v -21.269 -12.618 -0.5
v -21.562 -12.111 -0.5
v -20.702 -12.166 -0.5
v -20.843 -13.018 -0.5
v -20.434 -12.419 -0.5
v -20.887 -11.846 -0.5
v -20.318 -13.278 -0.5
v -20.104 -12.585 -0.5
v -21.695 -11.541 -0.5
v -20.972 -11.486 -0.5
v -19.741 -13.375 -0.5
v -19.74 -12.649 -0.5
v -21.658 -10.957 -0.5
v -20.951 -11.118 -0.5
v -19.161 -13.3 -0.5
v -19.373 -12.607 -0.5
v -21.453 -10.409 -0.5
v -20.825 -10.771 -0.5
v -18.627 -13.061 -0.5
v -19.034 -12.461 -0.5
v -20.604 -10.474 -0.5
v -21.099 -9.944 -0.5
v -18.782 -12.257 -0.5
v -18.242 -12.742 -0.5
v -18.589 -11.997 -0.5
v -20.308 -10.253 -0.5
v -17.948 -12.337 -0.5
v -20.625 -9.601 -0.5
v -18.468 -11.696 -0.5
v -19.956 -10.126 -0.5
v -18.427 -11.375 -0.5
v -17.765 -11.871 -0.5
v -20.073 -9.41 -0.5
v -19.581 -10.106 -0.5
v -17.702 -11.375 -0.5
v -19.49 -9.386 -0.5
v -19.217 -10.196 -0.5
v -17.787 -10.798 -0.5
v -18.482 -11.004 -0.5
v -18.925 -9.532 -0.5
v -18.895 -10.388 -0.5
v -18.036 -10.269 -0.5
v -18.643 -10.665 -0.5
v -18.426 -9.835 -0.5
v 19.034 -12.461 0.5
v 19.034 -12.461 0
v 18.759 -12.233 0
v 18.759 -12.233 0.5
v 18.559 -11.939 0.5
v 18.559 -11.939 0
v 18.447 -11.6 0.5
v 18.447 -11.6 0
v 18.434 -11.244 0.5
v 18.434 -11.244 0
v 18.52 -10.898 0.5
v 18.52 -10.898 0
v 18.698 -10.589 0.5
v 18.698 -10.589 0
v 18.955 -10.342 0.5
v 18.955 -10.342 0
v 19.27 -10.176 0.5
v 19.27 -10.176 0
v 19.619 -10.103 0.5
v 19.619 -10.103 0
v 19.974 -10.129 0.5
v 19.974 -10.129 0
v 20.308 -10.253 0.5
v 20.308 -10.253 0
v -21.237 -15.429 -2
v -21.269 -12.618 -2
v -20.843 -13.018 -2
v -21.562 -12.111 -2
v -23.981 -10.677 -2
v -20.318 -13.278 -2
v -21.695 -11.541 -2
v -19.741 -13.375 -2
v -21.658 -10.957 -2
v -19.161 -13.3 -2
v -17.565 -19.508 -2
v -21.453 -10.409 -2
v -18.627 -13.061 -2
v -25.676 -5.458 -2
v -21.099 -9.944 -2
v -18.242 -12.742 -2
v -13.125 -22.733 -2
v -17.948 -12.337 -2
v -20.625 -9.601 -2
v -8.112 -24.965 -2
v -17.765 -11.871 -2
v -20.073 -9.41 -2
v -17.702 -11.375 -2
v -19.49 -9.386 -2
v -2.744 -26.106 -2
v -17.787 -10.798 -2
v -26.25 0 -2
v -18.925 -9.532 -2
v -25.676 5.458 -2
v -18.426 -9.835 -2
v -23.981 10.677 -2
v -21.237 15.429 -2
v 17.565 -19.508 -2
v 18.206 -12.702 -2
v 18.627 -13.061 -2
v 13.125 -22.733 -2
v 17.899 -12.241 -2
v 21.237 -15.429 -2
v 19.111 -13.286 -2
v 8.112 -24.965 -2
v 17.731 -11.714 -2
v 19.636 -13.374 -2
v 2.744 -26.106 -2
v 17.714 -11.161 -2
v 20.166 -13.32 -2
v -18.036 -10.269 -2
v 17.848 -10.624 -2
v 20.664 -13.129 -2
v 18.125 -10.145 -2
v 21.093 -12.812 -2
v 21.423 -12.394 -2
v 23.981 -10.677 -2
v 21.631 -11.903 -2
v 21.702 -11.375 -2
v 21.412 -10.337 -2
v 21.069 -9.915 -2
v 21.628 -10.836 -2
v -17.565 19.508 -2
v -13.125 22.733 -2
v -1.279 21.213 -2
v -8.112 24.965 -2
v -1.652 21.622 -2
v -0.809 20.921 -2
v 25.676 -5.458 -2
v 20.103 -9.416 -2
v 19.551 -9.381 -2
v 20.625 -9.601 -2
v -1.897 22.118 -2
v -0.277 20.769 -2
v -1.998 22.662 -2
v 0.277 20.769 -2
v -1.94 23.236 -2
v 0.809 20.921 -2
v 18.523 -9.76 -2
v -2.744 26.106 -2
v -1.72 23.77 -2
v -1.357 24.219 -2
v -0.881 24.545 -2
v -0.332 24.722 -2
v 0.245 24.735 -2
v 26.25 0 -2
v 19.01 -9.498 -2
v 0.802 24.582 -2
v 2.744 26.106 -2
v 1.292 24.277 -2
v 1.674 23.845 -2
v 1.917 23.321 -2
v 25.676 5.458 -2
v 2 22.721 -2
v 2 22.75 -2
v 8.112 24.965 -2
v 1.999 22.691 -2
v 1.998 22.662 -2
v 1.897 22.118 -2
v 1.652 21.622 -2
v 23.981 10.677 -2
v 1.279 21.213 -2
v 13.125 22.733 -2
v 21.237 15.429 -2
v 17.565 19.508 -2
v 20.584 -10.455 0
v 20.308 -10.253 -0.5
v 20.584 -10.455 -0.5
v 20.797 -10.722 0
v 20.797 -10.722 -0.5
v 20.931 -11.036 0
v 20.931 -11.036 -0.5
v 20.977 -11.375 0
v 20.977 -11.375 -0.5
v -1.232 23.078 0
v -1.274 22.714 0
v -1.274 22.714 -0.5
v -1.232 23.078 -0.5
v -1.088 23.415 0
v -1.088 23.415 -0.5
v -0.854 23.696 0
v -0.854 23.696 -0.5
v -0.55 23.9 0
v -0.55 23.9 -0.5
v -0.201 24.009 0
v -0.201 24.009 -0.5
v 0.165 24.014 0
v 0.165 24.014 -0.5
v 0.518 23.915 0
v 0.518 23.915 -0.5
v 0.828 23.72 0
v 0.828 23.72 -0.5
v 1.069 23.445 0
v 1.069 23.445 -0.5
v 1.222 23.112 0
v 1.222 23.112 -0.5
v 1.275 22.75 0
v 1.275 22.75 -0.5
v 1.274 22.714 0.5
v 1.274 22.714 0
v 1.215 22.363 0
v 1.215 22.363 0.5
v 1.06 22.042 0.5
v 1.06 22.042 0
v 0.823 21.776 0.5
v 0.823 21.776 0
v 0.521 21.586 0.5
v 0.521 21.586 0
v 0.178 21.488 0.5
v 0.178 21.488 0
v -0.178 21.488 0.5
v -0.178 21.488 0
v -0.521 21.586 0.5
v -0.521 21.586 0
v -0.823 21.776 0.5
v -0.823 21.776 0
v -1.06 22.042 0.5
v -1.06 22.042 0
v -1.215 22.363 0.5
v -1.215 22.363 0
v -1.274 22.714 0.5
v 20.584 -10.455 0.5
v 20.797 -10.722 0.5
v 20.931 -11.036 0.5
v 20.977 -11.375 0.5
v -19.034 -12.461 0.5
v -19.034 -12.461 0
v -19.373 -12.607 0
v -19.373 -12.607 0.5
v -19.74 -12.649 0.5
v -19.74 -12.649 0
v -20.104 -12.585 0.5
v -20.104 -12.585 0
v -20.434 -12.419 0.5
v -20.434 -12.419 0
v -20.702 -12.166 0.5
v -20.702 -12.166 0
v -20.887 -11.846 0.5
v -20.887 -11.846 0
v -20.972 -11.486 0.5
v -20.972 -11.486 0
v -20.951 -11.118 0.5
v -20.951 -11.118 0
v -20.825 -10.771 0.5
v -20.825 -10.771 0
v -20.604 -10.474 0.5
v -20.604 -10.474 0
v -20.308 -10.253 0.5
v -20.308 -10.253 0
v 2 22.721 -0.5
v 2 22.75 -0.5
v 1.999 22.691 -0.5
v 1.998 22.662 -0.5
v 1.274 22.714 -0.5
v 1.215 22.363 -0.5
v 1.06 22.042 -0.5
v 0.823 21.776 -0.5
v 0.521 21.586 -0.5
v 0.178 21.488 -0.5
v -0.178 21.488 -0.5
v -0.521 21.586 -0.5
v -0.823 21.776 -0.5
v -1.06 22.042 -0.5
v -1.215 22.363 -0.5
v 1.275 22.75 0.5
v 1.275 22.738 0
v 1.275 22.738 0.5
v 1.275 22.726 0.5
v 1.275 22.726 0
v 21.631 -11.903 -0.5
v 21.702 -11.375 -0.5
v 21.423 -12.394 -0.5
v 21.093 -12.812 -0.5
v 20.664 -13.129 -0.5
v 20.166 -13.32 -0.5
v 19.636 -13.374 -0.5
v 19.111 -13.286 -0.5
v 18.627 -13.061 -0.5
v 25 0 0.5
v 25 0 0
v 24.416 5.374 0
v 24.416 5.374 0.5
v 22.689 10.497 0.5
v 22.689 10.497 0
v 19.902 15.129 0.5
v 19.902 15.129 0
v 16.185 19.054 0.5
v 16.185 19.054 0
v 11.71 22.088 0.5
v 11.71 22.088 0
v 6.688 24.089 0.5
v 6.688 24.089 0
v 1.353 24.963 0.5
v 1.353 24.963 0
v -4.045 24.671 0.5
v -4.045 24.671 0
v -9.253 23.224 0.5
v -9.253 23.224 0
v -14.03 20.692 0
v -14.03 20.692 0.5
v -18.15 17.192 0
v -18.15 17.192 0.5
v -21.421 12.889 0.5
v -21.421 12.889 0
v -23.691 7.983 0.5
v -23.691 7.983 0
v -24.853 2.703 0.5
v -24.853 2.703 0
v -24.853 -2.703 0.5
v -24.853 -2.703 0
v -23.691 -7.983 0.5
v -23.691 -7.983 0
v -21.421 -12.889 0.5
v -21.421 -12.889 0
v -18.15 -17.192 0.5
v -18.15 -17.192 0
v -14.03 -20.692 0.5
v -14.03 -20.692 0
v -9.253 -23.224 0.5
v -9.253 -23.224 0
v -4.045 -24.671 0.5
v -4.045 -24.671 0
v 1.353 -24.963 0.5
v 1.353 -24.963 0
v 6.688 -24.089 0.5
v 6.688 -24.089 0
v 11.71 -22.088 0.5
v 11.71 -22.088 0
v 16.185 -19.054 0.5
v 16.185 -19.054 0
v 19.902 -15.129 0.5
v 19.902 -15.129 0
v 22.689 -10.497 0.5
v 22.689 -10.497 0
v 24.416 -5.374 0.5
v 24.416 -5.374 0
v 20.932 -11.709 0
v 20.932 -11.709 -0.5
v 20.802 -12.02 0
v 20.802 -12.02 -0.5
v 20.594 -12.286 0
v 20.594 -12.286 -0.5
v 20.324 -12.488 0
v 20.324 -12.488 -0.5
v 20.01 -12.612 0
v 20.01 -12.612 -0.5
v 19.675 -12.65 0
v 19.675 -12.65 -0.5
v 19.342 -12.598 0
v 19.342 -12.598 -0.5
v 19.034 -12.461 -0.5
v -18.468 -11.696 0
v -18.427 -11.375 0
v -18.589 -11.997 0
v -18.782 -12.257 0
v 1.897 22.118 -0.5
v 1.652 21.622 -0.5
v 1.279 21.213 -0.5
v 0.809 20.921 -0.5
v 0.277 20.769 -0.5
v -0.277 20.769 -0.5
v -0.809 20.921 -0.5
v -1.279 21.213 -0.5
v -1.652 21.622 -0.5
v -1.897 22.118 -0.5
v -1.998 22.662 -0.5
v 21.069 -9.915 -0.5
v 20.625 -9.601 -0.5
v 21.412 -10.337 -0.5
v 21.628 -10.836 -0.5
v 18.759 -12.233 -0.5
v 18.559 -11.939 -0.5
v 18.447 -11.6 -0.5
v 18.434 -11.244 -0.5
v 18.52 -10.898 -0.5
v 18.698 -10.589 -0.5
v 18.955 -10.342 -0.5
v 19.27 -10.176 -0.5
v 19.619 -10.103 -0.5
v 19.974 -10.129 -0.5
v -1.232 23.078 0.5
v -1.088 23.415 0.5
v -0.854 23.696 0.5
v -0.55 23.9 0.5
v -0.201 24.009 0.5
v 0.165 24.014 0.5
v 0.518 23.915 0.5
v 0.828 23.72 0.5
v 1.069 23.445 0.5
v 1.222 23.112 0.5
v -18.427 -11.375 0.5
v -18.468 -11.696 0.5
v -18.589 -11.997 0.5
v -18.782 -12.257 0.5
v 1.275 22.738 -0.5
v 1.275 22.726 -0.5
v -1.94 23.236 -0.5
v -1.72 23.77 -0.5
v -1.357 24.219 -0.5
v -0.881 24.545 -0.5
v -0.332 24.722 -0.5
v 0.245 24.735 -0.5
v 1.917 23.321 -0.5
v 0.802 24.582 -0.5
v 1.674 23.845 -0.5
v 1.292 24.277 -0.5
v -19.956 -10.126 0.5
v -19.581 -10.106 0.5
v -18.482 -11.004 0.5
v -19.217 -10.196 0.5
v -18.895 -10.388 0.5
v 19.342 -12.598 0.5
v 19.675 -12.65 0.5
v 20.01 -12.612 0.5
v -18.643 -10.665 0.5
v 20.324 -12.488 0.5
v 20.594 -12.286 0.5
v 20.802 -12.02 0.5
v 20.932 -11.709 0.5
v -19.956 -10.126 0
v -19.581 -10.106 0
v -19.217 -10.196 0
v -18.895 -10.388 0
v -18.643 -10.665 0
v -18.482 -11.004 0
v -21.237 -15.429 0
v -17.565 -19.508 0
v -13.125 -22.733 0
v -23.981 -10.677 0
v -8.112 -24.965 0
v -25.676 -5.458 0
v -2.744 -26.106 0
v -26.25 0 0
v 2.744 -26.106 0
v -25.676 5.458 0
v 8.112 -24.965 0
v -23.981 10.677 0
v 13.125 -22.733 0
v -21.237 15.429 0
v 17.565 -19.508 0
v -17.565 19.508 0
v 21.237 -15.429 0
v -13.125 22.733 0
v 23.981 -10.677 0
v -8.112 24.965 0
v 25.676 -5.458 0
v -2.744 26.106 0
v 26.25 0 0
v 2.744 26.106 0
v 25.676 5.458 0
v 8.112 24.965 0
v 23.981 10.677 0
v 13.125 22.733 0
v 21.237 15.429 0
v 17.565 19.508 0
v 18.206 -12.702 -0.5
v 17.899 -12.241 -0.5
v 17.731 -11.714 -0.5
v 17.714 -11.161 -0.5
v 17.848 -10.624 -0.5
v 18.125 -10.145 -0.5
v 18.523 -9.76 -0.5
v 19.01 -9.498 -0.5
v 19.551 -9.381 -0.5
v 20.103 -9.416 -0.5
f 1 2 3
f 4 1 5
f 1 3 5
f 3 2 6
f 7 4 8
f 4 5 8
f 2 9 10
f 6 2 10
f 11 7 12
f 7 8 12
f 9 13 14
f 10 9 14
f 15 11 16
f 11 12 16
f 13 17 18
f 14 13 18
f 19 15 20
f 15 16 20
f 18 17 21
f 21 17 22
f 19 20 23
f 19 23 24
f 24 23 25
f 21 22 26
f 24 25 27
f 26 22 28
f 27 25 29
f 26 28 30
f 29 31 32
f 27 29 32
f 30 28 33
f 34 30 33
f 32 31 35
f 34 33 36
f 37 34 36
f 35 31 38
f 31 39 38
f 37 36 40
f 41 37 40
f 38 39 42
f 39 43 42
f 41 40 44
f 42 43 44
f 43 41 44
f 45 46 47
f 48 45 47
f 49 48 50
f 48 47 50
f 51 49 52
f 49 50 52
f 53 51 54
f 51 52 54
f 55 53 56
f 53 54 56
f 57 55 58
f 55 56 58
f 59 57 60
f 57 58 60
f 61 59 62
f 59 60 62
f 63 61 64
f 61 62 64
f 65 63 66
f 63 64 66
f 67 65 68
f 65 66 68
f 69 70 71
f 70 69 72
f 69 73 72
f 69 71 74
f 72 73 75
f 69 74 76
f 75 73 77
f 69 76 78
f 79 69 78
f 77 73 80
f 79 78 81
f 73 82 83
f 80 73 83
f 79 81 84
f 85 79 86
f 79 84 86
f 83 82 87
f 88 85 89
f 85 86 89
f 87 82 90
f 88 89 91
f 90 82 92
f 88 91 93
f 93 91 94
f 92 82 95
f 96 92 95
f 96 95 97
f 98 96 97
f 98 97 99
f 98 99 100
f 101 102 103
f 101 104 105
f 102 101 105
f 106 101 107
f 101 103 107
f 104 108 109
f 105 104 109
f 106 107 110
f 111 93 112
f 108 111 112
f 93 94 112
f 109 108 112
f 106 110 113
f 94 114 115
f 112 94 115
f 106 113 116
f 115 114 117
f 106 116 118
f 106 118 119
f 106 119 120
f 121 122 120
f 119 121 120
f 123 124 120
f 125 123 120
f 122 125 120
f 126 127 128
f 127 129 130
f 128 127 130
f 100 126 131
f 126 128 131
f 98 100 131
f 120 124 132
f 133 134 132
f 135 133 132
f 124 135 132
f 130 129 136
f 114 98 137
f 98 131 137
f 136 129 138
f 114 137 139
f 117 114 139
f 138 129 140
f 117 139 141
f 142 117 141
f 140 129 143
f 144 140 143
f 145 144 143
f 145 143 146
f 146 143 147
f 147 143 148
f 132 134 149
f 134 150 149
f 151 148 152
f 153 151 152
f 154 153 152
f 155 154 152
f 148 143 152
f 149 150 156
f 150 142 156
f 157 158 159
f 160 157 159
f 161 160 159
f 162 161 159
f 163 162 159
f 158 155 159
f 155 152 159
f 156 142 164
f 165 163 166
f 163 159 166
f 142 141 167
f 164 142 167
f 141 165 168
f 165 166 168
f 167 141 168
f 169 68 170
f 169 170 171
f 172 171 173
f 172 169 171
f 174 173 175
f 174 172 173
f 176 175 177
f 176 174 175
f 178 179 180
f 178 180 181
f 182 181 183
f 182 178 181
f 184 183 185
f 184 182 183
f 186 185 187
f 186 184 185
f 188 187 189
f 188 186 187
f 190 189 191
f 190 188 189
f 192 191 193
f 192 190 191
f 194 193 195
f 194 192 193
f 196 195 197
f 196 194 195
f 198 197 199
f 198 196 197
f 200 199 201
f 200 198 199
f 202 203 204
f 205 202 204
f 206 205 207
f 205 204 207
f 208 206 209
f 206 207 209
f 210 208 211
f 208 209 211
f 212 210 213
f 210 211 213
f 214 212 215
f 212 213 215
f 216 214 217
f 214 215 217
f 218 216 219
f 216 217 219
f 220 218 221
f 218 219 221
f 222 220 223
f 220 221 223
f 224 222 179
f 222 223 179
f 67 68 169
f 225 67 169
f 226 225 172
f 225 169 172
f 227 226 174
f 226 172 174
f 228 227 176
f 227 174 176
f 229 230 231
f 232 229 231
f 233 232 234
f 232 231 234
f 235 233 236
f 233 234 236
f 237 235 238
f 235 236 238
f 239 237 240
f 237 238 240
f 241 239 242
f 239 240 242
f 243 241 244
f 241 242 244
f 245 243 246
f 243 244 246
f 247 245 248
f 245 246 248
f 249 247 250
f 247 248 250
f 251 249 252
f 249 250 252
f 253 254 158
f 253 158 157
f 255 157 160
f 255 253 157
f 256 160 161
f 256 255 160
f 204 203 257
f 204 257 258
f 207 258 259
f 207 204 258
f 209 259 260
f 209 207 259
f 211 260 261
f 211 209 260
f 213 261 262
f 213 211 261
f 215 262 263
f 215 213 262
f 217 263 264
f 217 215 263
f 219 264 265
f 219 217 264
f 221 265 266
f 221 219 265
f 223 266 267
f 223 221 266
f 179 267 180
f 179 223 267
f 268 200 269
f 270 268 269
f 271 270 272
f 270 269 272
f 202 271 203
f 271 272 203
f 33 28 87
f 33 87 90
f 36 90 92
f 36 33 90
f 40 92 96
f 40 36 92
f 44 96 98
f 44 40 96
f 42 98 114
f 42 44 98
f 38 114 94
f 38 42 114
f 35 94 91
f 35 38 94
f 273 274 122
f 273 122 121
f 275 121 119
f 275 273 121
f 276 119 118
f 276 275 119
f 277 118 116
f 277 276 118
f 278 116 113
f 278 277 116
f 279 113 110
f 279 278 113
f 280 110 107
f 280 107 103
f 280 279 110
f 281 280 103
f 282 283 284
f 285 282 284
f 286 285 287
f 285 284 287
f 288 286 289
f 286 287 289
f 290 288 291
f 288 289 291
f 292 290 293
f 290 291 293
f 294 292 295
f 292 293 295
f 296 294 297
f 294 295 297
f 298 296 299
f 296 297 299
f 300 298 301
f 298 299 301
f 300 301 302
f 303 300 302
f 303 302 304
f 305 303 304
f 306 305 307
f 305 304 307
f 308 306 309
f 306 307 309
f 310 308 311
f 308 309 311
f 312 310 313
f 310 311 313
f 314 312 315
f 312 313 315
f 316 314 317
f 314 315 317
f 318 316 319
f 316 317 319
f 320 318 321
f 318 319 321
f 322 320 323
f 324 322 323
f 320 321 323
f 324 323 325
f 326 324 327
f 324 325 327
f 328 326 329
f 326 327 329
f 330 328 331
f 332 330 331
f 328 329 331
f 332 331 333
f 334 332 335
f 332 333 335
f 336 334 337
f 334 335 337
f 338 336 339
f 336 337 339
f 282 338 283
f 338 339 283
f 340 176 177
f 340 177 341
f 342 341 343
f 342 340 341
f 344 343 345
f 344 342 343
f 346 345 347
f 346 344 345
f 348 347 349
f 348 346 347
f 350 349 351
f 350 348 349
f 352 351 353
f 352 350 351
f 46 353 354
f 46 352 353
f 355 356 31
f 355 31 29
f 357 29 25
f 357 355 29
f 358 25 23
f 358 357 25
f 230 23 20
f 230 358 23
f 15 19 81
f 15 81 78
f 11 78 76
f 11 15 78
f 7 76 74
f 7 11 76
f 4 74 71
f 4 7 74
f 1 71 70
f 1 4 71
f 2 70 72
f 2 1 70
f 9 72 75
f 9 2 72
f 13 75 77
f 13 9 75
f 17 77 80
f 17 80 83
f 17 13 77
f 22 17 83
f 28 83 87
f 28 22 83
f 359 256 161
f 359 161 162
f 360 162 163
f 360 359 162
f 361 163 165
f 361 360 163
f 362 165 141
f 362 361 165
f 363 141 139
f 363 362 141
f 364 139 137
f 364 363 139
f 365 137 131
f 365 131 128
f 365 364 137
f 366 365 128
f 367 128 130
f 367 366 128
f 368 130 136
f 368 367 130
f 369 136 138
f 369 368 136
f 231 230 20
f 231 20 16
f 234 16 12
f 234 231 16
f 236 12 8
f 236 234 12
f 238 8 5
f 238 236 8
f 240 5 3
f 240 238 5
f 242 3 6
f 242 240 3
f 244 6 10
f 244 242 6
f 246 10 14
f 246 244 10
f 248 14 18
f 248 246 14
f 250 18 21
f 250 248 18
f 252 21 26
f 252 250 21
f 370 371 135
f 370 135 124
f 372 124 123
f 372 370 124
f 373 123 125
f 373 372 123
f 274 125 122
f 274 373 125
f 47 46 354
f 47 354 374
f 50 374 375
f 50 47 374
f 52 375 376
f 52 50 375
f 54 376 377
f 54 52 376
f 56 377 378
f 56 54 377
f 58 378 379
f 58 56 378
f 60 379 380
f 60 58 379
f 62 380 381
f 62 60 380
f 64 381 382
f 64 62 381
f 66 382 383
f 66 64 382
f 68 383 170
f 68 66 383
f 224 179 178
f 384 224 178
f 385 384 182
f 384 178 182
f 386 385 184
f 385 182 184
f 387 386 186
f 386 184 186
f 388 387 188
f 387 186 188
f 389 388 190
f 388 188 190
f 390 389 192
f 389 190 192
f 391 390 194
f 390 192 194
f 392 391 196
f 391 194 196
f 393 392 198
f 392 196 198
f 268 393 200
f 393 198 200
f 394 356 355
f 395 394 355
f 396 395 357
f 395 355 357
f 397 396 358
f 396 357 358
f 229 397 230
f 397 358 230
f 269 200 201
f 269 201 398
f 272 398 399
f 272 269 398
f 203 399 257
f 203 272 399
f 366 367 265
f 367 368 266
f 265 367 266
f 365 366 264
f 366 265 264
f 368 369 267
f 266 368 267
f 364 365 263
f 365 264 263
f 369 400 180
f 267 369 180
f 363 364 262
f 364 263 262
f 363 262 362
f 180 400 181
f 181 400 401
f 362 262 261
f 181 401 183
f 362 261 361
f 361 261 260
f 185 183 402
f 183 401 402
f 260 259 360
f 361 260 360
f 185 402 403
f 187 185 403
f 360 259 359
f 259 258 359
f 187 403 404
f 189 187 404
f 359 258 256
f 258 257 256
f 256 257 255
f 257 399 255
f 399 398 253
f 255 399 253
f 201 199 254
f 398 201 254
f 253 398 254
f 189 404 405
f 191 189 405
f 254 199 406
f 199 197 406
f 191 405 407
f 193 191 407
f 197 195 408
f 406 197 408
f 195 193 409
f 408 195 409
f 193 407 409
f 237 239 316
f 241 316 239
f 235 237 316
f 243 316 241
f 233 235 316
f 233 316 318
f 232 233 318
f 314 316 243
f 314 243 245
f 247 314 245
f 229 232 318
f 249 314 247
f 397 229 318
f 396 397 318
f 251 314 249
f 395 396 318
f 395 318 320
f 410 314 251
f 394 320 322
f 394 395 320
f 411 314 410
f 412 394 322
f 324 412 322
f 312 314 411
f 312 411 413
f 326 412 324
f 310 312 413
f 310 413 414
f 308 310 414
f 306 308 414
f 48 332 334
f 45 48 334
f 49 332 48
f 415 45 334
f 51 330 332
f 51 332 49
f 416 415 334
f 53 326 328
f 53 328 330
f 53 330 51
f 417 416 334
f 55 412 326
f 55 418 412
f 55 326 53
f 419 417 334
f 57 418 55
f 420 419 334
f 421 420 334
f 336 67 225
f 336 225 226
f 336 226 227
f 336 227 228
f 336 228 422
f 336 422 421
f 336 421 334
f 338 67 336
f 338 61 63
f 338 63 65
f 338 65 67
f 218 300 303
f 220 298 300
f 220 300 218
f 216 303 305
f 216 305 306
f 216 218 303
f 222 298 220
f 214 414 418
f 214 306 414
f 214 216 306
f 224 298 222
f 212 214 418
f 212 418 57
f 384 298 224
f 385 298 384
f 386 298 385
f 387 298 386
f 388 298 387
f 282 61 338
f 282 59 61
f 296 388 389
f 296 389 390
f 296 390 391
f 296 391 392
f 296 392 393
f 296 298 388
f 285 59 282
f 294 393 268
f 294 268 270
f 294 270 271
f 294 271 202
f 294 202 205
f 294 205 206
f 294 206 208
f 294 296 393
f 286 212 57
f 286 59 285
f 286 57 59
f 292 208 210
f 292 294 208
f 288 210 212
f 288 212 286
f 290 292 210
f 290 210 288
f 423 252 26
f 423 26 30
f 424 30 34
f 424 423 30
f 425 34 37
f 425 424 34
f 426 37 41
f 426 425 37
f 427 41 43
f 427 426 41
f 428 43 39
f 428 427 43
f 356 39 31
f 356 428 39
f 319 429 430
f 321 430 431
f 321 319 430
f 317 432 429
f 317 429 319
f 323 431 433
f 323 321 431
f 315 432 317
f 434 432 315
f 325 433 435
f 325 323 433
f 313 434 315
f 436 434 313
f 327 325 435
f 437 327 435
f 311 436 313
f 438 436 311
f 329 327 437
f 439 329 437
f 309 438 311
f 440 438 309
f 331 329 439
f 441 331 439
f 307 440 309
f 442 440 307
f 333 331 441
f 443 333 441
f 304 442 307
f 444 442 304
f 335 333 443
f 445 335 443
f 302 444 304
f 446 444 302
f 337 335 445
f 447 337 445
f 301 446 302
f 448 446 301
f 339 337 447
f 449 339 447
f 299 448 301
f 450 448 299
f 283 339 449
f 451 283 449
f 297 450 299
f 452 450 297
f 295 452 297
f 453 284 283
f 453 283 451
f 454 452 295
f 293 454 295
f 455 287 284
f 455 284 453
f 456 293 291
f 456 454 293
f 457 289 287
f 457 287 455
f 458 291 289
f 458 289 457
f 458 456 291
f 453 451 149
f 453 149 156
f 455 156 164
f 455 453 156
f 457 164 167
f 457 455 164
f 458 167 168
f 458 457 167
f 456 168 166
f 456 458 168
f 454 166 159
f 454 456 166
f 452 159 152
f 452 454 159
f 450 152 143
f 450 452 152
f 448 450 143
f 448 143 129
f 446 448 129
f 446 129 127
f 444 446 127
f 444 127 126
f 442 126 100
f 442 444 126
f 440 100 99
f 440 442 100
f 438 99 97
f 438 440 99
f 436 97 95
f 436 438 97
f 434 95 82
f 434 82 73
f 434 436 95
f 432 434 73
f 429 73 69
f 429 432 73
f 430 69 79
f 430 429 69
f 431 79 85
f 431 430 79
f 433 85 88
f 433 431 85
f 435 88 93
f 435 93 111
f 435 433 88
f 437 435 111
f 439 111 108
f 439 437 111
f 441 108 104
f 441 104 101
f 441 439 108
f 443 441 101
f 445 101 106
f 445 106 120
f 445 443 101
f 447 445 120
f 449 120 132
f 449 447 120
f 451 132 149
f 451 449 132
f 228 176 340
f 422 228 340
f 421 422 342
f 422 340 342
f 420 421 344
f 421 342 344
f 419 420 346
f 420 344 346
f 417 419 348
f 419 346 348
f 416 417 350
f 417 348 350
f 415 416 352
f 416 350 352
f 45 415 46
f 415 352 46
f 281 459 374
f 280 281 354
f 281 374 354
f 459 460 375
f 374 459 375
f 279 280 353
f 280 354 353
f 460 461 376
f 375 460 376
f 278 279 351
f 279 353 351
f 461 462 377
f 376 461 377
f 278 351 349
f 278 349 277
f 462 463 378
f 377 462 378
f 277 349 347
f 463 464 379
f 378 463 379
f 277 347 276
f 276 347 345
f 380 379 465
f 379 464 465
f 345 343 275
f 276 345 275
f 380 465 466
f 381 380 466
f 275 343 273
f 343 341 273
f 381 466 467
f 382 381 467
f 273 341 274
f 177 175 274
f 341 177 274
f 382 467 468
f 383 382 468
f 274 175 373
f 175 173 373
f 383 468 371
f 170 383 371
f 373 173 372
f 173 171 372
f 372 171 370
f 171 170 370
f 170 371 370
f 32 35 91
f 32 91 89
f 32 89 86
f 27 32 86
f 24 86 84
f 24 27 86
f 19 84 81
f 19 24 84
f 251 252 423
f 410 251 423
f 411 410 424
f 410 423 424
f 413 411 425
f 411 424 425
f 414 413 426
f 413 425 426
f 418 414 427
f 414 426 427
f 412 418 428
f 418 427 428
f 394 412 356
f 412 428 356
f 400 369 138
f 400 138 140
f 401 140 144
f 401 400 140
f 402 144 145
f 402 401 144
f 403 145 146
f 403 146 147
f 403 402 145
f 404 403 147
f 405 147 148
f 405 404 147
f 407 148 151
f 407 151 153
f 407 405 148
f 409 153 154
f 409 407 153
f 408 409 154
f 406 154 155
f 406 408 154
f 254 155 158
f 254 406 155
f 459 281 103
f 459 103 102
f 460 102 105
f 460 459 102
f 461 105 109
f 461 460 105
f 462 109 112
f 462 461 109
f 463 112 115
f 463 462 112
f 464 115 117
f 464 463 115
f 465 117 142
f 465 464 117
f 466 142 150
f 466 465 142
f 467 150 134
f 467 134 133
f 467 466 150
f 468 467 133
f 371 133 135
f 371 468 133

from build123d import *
from build123d import SkipClean  # not in build123d's __all__

# Parameters (mm, degrees)
F0_R     = 25
F1_DEPTH = 0.5
F0_R_2   = 26.25
F2_DEPTH = 2
F3_DEPTH = 0.5


with BuildPart() as f1:
    # F0 (on Top) → F1 (new body)
    with BuildSketch(Plane.XY):
        Circle(F0_R)
        with BuildLine():
            ThreePointArc((1.998066932, 22.6620879121), (16.7782377308, 15.3640241684), (22.75, 0))
            ThreePointArc((22.75, 0), (22.2123921898, -4.9165163688), (20.6249773007, -9.6006672345))
            ThreePointArc((20.6249773007, -9.6006672345), (21.4117268371, -10.3371654104), (21.7020779361, -11.375))
            ThreePointArc((21.7020779361, -11.375), (20.6637600211, -13.12861557), (18.6269103687, -13.0614206776))
            ThreePointArc((18.6269103687, -13.0614206776), (0, -22.75), (-18.6269103687, -13.0614206776))
            ThreePointArc((-18.6269103687, -13.0614206776), (-21.4341287437, -12.375), (-20.6249773007, -9.6006672345))
            ThreePointArc((-20.6249773007, -9.6006672345), (-19.7020779361, 11.375), (-1.998066932, 22.6620879121))
            ThreePointArc((-1.998066932, 22.6620879121), (-0.0439666691, 24.7495166746), (2, 22.75))
            ThreePointArc((2, 22.75), (1.9995166746, 22.7060333309), (1.998066932, 22.6620879121))
        make_face(mode=Mode.SUBTRACT)
        with BuildLine():
            ThreePointArc((20.6249773007, -9.6006672345), (22.2123921898, -4.9165163688), (22.75, 0))
            ThreePointArc((22.75, 0), (16.7782377308, 15.3640241684), (1.998066932, 22.6620879121))
            ThreePointArc((1.998066932, 22.6620879121), (0, 20.75), (-1.998066932, 22.6620879121))
            ThreePointArc((-1.998066932, 22.6620879121), (-19.7020779361, 11.375), (-20.6249773007, -9.6006672345))
            ThreePointArc((-20.6249773007, -9.6006672345), (-18.6642433465, -9.665351099), (-17.7020779361, -11.375))
            ThreePointArc((-17.7020779361, -11.375), (-17.9484623661, -12.336682085), (-18.6269103687, -13.0614206776))
            ThreePointArc((-18.6269103687, -13.0614206776), (0, -22.75), (18.6269103687, -13.0614206776))
            ThreePointArc((18.6269103687, -13.0614206776), (17.9700271285, -10.375), (20.6249773007, -9.6006672345))
        make_face()
        with BuildLine():
            ThreePointArc((-20.3083862198, -10.2533872036), (-20.4692836493, -9.9282892225), (-20.6249773007, -9.6006672345))
            ThreePointArc((-20.6249773007, -9.6006672345), (-21.4341287437, -12.375), (-18.6269103687, -13.0614206776))
            ThreePointArc((-18.6269103687, -13.0614206776), (-18.8327925074, -12.7627750263), (-19.0338869031, -12.4608847744))
            ThreePointArc((-19.0338869031, -12.4608847744), (-20.8062603259, -12.0125), (-20.3083862198, -10.2533872036))
        make_face()
        with BuildLine():
            ThreePointArc((21.7020779361, -11.375), (21.4117268371, -10.3371654104), (20.6249773007, -9.6006672345))
            ThreePointArc((20.6249773007, -9.6006672345), (20.4692836493, -9.9282892225), (20.3083862198, -10.2533872036))
            ThreePointArc((20.3083862198, -10.2533872036), (20.797219037, -10.7220903821), (20.9770779361, -11.375))
            ThreePointArc((20.9770779361, -11.375), (20.3240431413, -12.4880068659), (19.0338869031, -12.4608847744))
            ThreePointArc((19.0338869031, -12.4608847744), (18.8327925074, -12.7627750263), (18.6269103687, -13.0614206776))
            ThreePointArc((18.6269103687, -13.0614206776), (20.6637600211, -13.12861557), (21.7020779361, -11.375))
        make_face()
        with BuildLine():
            ThreePointArc((1.2744993168, 22.714271978), (1.6364911418, 22.6910642488), (1.998066932, 22.6620879121))
            ThreePointArc((1.998066932, 22.6620879121), (1.9995166746, 22.7060333309), (2, 22.75))
            ThreePointArc((2, 22.75), (-0.0439666691, 24.7495166746), (-1.998066932, 22.6620879121))
            ThreePointArc((-1.998066932, 22.6620879121), (-1.6364911418, 22.6910642488), (-1.2744993168, 22.714271978))
            ThreePointArc((-1.2744993168, 22.714271978), (-0.017865765, 24.024874823), (1.275, 22.75))
            ThreePointArc((1.275, 22.75), (1.274874823, 22.732134235), (1.2744993168, 22.714271978))
        make_face()
        with BuildLine():
            ThreePointArc((-17.7020779361, -11.375), (-18.6642433465, -9.665351099), (-20.6249773007, -9.6006672345))
            ThreePointArc((-20.6249773007, -9.6006672345), (-20.4692836493, -9.9282892225), (-20.3083862198, -10.2533872036))
            ThreePointArc((-20.3083862198, -10.2533872036), (-19.0491683182, -10.2798588991), (-18.4270779361, -11.375))
            ThreePointArc((-18.4270779361, -11.375), (-18.5890710702, -11.9969652052), (-19.0338869031, -12.4608847744))
            ThreePointArc((-19.0338869031, -12.4608847744), (-18.8327925074, -12.7627750263), (-18.6269103687, -13.0614206776))
            ThreePointArc((-18.6269103687, -13.0614206776), (-17.9484623661, -12.336682085), (-17.7020779361, -11.375))
        make_face()
        with BuildLine():
            ThreePointArc((20.3083862198, -10.2533872036), (20.4692836493, -9.9282892225), (20.6249773007, -9.6006672345))
            ThreePointArc((20.6249773007, -9.6006672345), (17.9700271285, -10.375), (18.6269103687, -13.0614206776))
            ThreePointArc((18.6269103687, -13.0614206776), (18.8327925074, -12.7627750263), (19.0338869031, -12.4608847744))
            ThreePointArc((19.0338869031, -12.4608847744), (18.5978955463, -10.7375), (20.3083862198, -10.2533872036))
        make_face()
        with BuildLine():
            ThreePointArc((-1.998066932, 22.6620879121), (0, 20.75), (1.998066932, 22.6620879121))
            ThreePointArc((1.998066932, 22.6620879121), (1.6364911418, 22.6910642488), (1.2744993168, 22.714271978))
            ThreePointArc((1.2744993168, 22.714271978), (0, 21.475), (-1.2744993168, 22.714271978))
            ThreePointArc((-1.2744993168, 22.714271978), (-1.6364911418, 22.6910642488), (-1.998066932, 22.6620879121))
        make_face()
    extrude(amount=F1_DEPTH)

    # F0 (on Top) → F2 (join)
    with BuildSketch(Plane.XY):
        Circle(F0_R_2)
        Circle(F0_R, mode=Mode.SUBTRACT)
        Circle(F0_R)
        with BuildLine():
            ThreePointArc((1.998066932, 22.6620879121), (16.7782377308, 15.3640241684), (22.75, 0))
            ThreePointArc((22.75, 0), (22.2123921898, -4.9165163688), (20.6249773007, -9.6006672345))
            ThreePointArc((20.6249773007, -9.6006672345), (21.4117268371, -10.3371654104), (21.7020779361, -11.375))
            ThreePointArc((21.7020779361, -11.375), (20.6637600211, -13.12861557), (18.6269103687, -13.0614206776))
            ThreePointArc((18.6269103687, -13.0614206776), (0, -22.75), (-18.6269103687, -13.0614206776))
            ThreePointArc((-18.6269103687, -13.0614206776), (-21.4341287437, -12.375), (-20.6249773007, -9.6006672345))
            ThreePointArc((-20.6249773007, -9.6006672345), (-19.7020779361, 11.375), (-1.998066932, 22.6620879121))
            ThreePointArc((-1.998066932, 22.6620879121), (-0.0439666691, 24.7495166746), (2, 22.75))
            ThreePointArc((2, 22.75), (1.9995166746, 22.7060333309), (1.998066932, 22.6620879121))
        make_face(mode=Mode.SUBTRACT)
        with BuildLine():
            ThreePointArc((20.6249773007, -9.6006672345), (22.2123921898, -4.9165163688), (22.75, 0))
            ThreePointArc((22.75, 0), (16.7782377308, 15.3640241684), (1.998066932, 22.6620879121))
            ThreePointArc((1.998066932, 22.6620879121), (0, 20.75), (-1.998066932, 22.6620879121))
            ThreePointArc((-1.998066932, 22.6620879121), (-19.7020779361, 11.375), (-20.6249773007, -9.6006672345))
            ThreePointArc((-20.6249773007, -9.6006672345), (-18.6642433465, -9.665351099), (-17.7020779361, -11.375))
            ThreePointArc((-17.7020779361, -11.375), (-17.9484623661, -12.336682085), (-18.6269103687, -13.0614206776))
            ThreePointArc((-18.6269103687, -13.0614206776), (0, -22.75), (18.6269103687, -13.0614206776))
            ThreePointArc((18.6269103687, -13.0614206776), (17.9700271285, -10.375), (20.6249773007, -9.6006672345))
        make_face()
    extrude(amount=-F2_DEPTH)

    # F0 (on Top) → F3 (join)
    with BuildSketch(Plane.XY):
        with BuildLine():
            ThreePointArc((1.2744993168, 22.714271978), (1.6364911418, 22.6910642488), (1.998066932, 22.6620879121))
            ThreePointArc((1.998066932, 22.6620879121), (1.9995166746, 22.7060333309), (2, 22.75))
            ThreePointArc((2, 22.75), (-0.0439666691, 24.7495166746), (-1.998066932, 22.6620879121))
            ThreePointArc((-1.998066932, 22.6620879121), (-1.6364911418, 22.6910642488), (-1.2744993168, 22.714271978))
            ThreePointArc((-1.2744993168, 22.714271978), (-0.017865765, 24.024874823), (1.275, 22.75))
            ThreePointArc((1.275, 22.75), (1.274874823, 22.732134235), (1.2744993168, 22.714271978))
        make_face()
        with BuildLine():
            ThreePointArc((-1.998066932, 22.6620879121), (0, 20.75), (1.998066932, 22.6620879121))
            ThreePointArc((1.998066932, 22.6620879121), (1.6364911418, 22.6910642488), (1.2744993168, 22.714271978))
            ThreePointArc((1.2744993168, 22.714271978), (0, 21.475), (-1.2744993168, 22.714271978))
            ThreePointArc((-1.2744993168, 22.714271978), (-1.6364911418, 22.6910642488), (-1.998066932, 22.6620879121))
        make_face()
        with BuildLine():
            ThreePointArc((-20.3083862198, -10.2533872036), (-20.4692836493, -9.9282892225), (-20.6249773007, -9.6006672345))
            ThreePointArc((-20.6249773007, -9.6006672345), (-21.4341287437, -12.375), (-18.6269103687, -13.0614206776))
            ThreePointArc((-18.6269103687, -13.0614206776), (-18.8327925074, -12.7627750263), (-19.0338869031, -12.4608847744))
            ThreePointArc((-19.0338869031, -12.4608847744), (-20.8062603259, -12.0125), (-20.3083862198, -10.2533872036))
        make_face()
        with BuildLine():
            ThreePointArc((-17.7020779361, -11.375), (-18.6642433465, -9.665351099), (-20.6249773007, -9.6006672345))
            ThreePointArc((-20.6249773007, -9.6006672345), (-20.4692836493, -9.9282892225), (-20.3083862198, -10.2533872036))
            ThreePointArc((-20.3083862198, -10.2533872036), (-19.0491683182, -10.2798588991), (-18.4270779361, -11.375))
            ThreePointArc((-18.4270779361, -11.375), (-18.5890710702, -11.9969652052), (-19.0338869031, -12.4608847744))
            ThreePointArc((-19.0338869031, -12.4608847744), (-18.8327925074, -12.7627750263), (-18.6269103687, -13.0614206776))
            ThreePointArc((-18.6269103687, -13.0614206776), (-17.9484623661, -12.336682085), (-17.7020779361, -11.375))
        make_face()
        with BuildLine():
            ThreePointArc((20.3083862198, -10.2533872036), (20.4692836493, -9.9282892225), (20.6249773007, -9.6006672345))
            ThreePointArc((20.6249773007, -9.6006672345), (17.9700271285, -10.375), (18.6269103687, -13.0614206776))
            ThreePointArc((18.6269103687, -13.0614206776), (18.8327925074, -12.7627750263), (19.0338869031, -12.4608847744))
            ThreePointArc((19.0338869031, -12.4608847744), (18.5978955463, -10.7375), (20.3083862198, -10.2533872036))
        make_face()
        with BuildLine():
            ThreePointArc((21.7020779361, -11.375), (21.4117268371, -10.3371654104), (20.6249773007, -9.6006672345))
            ThreePointArc((20.6249773007, -9.6006672345), (20.4692836493, -9.9282892225), (20.3083862198, -10.2533872036))
            ThreePointArc((20.3083862198, -10.2533872036), (20.797219037, -10.7220903821), (20.9770779361, -11.375))
            ThreePointArc((20.9770779361, -11.375), (20.3240431413, -12.4880068659), (19.0338869031, -12.4608847744))
            ThreePointArc((19.0338869031, -12.4608847744), (18.8327925074, -12.7627750263), (18.6269103687, -13.0614206776))
            ThreePointArc((18.6269103687, -13.0614206776), (20.6637600211, -13.12861557), (21.7020779361, -11.375))
        make_face()
    with SkipClean():  # cleaning this boolean's faces spoils the solid; the shape is the same uncleaned
        extrude(amount=-F3_DEPTH)


solid = f1.part
